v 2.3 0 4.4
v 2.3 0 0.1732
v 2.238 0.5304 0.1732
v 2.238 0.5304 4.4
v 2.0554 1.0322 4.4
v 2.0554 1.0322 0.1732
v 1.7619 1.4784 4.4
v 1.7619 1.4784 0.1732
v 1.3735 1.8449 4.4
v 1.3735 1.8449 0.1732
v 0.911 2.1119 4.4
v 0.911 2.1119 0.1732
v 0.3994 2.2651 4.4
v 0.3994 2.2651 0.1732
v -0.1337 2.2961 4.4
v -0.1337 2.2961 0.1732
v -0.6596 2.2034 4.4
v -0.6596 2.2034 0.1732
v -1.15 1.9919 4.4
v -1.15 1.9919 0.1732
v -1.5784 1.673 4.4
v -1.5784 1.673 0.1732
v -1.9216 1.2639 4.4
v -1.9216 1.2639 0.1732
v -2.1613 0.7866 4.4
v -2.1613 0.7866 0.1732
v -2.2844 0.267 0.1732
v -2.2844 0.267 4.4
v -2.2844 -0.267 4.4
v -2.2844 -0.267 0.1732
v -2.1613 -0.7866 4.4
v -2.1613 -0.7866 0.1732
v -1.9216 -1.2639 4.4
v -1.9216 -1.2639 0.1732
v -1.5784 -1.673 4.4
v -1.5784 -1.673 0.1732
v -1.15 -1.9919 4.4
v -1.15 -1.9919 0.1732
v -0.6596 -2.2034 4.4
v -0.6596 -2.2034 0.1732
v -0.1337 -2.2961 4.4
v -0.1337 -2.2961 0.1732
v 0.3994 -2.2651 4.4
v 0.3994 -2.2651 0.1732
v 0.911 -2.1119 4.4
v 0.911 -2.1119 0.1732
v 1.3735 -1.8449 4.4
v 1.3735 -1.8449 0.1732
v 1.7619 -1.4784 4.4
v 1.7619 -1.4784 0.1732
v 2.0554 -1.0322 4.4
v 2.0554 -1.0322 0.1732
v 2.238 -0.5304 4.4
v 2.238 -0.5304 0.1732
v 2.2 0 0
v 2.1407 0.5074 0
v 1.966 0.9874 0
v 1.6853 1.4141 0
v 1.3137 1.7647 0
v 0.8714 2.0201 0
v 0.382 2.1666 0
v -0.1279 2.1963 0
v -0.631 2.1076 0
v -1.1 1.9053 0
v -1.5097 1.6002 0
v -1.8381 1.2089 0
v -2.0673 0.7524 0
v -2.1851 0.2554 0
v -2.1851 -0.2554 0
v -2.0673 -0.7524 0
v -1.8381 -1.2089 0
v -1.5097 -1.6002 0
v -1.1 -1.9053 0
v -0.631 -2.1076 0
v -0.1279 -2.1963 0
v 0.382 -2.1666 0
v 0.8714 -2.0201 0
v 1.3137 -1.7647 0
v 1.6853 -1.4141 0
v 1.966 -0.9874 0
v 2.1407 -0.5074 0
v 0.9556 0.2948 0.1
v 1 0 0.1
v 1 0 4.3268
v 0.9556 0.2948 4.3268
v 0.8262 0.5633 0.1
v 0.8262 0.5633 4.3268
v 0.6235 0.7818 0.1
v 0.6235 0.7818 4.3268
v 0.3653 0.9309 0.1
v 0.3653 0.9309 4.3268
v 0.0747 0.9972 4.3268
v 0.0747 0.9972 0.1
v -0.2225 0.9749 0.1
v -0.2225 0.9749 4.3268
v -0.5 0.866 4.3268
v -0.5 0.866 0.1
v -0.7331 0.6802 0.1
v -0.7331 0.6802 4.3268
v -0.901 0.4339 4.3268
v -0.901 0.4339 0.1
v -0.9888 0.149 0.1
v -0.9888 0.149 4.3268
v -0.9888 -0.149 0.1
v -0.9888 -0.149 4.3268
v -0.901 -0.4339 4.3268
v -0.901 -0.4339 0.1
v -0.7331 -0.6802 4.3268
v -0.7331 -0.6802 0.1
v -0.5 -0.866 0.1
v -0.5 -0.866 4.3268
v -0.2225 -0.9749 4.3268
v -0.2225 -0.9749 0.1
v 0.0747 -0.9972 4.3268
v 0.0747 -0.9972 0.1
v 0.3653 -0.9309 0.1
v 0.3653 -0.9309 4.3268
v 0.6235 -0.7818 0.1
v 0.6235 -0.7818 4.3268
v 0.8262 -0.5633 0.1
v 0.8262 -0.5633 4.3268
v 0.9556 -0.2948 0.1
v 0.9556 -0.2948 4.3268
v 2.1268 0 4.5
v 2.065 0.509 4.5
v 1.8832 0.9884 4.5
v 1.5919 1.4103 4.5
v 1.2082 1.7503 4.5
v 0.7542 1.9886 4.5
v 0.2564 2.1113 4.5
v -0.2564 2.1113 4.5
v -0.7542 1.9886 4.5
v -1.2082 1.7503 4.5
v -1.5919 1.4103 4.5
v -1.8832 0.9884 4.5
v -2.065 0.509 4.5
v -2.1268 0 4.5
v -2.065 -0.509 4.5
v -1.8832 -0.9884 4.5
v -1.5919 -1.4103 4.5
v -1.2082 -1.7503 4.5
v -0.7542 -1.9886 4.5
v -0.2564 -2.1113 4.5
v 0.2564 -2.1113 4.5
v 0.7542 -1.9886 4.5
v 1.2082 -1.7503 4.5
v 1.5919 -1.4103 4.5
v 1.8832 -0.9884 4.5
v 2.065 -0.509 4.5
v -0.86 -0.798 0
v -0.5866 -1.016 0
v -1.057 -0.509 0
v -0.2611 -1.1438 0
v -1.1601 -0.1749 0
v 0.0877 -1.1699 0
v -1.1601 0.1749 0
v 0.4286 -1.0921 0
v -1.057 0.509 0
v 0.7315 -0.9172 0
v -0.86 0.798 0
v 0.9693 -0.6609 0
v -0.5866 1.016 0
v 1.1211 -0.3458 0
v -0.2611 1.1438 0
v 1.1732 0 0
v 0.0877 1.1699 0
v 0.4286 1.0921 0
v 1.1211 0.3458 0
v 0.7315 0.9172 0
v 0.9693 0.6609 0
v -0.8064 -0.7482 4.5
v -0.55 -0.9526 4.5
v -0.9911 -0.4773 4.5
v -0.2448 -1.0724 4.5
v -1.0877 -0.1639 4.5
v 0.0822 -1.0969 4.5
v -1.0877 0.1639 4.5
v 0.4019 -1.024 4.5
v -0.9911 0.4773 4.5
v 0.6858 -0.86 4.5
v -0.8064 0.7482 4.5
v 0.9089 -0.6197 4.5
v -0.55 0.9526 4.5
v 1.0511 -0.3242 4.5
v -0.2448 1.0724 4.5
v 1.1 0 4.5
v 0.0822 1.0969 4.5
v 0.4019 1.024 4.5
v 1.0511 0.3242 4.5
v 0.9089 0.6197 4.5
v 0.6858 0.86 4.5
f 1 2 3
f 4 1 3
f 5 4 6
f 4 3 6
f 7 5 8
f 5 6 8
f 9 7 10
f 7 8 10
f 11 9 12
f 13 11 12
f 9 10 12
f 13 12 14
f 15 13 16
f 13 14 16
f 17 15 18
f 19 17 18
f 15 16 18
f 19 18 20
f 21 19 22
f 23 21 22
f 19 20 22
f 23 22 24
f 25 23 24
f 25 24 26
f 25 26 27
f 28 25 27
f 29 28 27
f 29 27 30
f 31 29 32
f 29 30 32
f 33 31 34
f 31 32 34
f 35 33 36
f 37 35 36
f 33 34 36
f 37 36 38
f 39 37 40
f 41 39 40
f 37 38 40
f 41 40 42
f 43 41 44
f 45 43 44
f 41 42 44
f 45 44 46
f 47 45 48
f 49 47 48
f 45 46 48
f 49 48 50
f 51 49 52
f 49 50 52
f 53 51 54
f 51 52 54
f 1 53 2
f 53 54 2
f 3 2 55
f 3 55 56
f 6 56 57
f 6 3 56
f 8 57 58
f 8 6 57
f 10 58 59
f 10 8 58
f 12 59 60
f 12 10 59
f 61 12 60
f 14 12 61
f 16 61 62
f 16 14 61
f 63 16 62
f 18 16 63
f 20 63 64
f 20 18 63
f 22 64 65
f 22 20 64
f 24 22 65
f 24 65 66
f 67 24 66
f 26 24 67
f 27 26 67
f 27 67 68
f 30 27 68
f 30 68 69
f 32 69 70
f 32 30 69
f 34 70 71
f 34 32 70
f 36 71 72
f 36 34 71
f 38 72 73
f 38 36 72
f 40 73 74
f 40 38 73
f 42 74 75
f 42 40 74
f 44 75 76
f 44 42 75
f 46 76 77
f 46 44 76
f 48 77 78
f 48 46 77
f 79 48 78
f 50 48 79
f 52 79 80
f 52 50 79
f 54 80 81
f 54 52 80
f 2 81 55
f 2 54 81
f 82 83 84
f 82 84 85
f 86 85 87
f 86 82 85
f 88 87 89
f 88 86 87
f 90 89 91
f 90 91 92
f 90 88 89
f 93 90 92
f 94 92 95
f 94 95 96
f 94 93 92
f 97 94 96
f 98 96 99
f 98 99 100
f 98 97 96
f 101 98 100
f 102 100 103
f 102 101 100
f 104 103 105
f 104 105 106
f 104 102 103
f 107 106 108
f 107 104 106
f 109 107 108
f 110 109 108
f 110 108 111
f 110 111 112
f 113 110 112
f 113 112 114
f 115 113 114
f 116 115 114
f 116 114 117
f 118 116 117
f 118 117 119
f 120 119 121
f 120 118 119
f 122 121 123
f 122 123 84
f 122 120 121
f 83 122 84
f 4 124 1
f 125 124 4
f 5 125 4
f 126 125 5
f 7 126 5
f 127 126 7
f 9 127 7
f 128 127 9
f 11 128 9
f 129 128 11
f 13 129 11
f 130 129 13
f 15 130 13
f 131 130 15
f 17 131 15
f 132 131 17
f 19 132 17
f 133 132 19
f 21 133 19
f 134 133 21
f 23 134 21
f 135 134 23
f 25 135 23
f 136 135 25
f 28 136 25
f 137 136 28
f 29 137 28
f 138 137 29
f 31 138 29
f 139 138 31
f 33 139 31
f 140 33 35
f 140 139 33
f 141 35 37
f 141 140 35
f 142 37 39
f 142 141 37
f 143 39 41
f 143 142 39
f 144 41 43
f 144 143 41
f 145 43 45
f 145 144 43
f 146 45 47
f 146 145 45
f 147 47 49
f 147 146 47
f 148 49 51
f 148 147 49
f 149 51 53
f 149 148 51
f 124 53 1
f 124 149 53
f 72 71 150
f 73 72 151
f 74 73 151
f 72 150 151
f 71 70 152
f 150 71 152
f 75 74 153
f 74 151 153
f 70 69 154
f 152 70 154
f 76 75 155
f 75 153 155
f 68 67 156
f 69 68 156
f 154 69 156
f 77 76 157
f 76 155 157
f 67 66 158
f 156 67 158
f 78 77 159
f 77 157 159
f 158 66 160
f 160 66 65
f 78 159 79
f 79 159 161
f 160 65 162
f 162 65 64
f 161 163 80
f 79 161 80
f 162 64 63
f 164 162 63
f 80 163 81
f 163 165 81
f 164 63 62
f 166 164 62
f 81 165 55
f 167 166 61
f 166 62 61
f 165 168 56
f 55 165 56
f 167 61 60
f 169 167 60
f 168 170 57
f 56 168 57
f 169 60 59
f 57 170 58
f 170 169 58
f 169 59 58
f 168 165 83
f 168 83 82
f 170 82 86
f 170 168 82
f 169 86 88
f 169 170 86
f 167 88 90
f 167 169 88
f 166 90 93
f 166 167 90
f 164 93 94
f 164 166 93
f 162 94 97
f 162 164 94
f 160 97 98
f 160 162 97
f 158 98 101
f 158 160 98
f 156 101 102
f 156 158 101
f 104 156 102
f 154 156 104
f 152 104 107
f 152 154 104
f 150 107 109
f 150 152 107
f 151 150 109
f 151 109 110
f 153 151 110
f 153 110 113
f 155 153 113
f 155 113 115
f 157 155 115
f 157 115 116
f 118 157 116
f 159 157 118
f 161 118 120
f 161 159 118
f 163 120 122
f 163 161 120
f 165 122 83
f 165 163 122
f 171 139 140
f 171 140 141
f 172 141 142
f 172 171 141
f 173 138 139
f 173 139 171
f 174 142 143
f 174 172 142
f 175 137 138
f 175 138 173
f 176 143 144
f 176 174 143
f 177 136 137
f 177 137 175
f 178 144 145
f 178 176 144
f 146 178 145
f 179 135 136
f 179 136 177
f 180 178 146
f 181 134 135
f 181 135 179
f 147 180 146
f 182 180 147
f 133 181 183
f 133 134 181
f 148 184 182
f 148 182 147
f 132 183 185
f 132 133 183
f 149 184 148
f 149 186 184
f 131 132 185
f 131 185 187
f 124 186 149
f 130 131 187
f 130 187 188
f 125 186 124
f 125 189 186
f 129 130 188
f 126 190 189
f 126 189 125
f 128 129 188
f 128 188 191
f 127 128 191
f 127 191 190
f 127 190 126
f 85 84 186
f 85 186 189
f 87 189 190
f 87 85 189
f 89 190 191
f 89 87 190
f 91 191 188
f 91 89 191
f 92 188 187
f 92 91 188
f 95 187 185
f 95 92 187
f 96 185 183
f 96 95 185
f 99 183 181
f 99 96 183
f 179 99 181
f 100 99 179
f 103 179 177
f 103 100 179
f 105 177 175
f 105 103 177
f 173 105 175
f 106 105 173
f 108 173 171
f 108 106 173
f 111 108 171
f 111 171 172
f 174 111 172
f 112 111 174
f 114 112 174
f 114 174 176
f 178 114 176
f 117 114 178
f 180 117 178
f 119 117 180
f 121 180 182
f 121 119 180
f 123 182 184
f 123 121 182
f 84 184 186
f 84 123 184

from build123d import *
from OCP.BRepFilletAPI import BRepFilletAPI_MakeChamfer

# Parameters (mm, degrees)
SZKIC1_R                    = 2.3
SZKIC1_R_2                  = 1
DODANIE_WYCI_GNI_CIE1_DEPTH = 4.5
SFAZOWANIE1_SIZE            = 0.1
SFAZOWANIE1_SIZE2           = 0.173205081


with BuildPart() as part:
    # Szkic1 → Dodanie-wyciągnięcie1 (new body)
    with BuildSketch(Plane.XY):
        Circle(SZKIC1_R)
        Circle(SZKIC1_R_2, mode=Mode.SUBTRACT)
    extrude(amount=DODANIE_WYCI_GNI_CIE1_DEPTH)

    # Sfazowanie1: one chamfer whose edges measure the first distance from different faces: ONE call of the kernel's chamfer builder (chamfer() names one face for all edges)
    sfazowanie1_edges_1 = [part.edges().sort_by_distance(p)[0] for p in [
        (-2.3, 0, 0),
    ]]
    sfazowanie1_side_1 = [part.faces().sort_by_distance(p)[0] for p in [
        (-2.234946176, 0, 0),
    ]]
    sfazowanie1_edges_2 = [part.edges().sort_by_distance(p)[0] for p in [
        (-2.3, 0, 4.5),
    ]]
    sfazowanie1_side_2 = [part.faces().sort_by_distance(p)[0] for p in [
        (-2.3, 0, 2.25),
    ]]
    sfazowanie1_edges_3 = [part.edges().sort_by_distance(p)[0] for p in [
        (-1, 0, 0),
    ]]
    sfazowanie1_side_3 = [part.faces().sort_by_distance(p)[0] for p in [
        (-1, 0, 2.25),
    ]]
    sfazowanie1_edges_4 = [part.edges().sort_by_distance(p)[0] for p in [
        (-1, 0, 4.5),
    ]]
    sfazowanie1_side_4 = [part.faces().sort_by_distance(p)[0] for p in [
        (-2.234946176, 0, 4.5),
    ]]
    sfazowanie1 = BRepFilletAPI_MakeChamfer(part.part.solid().wrapped)
    for e in sfazowanie1_edges_1:
        sfazowanie1.Add(SFAZOWANIE1_SIZE, SFAZOWANIE1_SIZE2, e.wrapped, sfazowanie1_side_1[0].wrapped)  # the first distance lies on this face
    for e in sfazowanie1_edges_2:
        sfazowanie1.Add(SFAZOWANIE1_SIZE, SFAZOWANIE1_SIZE2, e.wrapped, sfazowanie1_side_2[0].wrapped)  # the first distance lies on this face
    for e in sfazowanie1_edges_3:
        sfazowanie1.Add(SFAZOWANIE1_SIZE, SFAZOWANIE1_SIZE2, e.wrapped, sfazowanie1_side_3[0].wrapped)  # the first distance lies on this face
    for e in sfazowanie1_edges_4:
        sfazowanie1.Add(SFAZOWANIE1_SIZE, SFAZOWANIE1_SIZE2, e.wrapped, sfazowanie1_side_4[0].wrapped)  # the first distance lies on this face
    add(Compound.cast(sfazowanie1.Shape()), mode=Mode.REPLACE)


solid = part.part
